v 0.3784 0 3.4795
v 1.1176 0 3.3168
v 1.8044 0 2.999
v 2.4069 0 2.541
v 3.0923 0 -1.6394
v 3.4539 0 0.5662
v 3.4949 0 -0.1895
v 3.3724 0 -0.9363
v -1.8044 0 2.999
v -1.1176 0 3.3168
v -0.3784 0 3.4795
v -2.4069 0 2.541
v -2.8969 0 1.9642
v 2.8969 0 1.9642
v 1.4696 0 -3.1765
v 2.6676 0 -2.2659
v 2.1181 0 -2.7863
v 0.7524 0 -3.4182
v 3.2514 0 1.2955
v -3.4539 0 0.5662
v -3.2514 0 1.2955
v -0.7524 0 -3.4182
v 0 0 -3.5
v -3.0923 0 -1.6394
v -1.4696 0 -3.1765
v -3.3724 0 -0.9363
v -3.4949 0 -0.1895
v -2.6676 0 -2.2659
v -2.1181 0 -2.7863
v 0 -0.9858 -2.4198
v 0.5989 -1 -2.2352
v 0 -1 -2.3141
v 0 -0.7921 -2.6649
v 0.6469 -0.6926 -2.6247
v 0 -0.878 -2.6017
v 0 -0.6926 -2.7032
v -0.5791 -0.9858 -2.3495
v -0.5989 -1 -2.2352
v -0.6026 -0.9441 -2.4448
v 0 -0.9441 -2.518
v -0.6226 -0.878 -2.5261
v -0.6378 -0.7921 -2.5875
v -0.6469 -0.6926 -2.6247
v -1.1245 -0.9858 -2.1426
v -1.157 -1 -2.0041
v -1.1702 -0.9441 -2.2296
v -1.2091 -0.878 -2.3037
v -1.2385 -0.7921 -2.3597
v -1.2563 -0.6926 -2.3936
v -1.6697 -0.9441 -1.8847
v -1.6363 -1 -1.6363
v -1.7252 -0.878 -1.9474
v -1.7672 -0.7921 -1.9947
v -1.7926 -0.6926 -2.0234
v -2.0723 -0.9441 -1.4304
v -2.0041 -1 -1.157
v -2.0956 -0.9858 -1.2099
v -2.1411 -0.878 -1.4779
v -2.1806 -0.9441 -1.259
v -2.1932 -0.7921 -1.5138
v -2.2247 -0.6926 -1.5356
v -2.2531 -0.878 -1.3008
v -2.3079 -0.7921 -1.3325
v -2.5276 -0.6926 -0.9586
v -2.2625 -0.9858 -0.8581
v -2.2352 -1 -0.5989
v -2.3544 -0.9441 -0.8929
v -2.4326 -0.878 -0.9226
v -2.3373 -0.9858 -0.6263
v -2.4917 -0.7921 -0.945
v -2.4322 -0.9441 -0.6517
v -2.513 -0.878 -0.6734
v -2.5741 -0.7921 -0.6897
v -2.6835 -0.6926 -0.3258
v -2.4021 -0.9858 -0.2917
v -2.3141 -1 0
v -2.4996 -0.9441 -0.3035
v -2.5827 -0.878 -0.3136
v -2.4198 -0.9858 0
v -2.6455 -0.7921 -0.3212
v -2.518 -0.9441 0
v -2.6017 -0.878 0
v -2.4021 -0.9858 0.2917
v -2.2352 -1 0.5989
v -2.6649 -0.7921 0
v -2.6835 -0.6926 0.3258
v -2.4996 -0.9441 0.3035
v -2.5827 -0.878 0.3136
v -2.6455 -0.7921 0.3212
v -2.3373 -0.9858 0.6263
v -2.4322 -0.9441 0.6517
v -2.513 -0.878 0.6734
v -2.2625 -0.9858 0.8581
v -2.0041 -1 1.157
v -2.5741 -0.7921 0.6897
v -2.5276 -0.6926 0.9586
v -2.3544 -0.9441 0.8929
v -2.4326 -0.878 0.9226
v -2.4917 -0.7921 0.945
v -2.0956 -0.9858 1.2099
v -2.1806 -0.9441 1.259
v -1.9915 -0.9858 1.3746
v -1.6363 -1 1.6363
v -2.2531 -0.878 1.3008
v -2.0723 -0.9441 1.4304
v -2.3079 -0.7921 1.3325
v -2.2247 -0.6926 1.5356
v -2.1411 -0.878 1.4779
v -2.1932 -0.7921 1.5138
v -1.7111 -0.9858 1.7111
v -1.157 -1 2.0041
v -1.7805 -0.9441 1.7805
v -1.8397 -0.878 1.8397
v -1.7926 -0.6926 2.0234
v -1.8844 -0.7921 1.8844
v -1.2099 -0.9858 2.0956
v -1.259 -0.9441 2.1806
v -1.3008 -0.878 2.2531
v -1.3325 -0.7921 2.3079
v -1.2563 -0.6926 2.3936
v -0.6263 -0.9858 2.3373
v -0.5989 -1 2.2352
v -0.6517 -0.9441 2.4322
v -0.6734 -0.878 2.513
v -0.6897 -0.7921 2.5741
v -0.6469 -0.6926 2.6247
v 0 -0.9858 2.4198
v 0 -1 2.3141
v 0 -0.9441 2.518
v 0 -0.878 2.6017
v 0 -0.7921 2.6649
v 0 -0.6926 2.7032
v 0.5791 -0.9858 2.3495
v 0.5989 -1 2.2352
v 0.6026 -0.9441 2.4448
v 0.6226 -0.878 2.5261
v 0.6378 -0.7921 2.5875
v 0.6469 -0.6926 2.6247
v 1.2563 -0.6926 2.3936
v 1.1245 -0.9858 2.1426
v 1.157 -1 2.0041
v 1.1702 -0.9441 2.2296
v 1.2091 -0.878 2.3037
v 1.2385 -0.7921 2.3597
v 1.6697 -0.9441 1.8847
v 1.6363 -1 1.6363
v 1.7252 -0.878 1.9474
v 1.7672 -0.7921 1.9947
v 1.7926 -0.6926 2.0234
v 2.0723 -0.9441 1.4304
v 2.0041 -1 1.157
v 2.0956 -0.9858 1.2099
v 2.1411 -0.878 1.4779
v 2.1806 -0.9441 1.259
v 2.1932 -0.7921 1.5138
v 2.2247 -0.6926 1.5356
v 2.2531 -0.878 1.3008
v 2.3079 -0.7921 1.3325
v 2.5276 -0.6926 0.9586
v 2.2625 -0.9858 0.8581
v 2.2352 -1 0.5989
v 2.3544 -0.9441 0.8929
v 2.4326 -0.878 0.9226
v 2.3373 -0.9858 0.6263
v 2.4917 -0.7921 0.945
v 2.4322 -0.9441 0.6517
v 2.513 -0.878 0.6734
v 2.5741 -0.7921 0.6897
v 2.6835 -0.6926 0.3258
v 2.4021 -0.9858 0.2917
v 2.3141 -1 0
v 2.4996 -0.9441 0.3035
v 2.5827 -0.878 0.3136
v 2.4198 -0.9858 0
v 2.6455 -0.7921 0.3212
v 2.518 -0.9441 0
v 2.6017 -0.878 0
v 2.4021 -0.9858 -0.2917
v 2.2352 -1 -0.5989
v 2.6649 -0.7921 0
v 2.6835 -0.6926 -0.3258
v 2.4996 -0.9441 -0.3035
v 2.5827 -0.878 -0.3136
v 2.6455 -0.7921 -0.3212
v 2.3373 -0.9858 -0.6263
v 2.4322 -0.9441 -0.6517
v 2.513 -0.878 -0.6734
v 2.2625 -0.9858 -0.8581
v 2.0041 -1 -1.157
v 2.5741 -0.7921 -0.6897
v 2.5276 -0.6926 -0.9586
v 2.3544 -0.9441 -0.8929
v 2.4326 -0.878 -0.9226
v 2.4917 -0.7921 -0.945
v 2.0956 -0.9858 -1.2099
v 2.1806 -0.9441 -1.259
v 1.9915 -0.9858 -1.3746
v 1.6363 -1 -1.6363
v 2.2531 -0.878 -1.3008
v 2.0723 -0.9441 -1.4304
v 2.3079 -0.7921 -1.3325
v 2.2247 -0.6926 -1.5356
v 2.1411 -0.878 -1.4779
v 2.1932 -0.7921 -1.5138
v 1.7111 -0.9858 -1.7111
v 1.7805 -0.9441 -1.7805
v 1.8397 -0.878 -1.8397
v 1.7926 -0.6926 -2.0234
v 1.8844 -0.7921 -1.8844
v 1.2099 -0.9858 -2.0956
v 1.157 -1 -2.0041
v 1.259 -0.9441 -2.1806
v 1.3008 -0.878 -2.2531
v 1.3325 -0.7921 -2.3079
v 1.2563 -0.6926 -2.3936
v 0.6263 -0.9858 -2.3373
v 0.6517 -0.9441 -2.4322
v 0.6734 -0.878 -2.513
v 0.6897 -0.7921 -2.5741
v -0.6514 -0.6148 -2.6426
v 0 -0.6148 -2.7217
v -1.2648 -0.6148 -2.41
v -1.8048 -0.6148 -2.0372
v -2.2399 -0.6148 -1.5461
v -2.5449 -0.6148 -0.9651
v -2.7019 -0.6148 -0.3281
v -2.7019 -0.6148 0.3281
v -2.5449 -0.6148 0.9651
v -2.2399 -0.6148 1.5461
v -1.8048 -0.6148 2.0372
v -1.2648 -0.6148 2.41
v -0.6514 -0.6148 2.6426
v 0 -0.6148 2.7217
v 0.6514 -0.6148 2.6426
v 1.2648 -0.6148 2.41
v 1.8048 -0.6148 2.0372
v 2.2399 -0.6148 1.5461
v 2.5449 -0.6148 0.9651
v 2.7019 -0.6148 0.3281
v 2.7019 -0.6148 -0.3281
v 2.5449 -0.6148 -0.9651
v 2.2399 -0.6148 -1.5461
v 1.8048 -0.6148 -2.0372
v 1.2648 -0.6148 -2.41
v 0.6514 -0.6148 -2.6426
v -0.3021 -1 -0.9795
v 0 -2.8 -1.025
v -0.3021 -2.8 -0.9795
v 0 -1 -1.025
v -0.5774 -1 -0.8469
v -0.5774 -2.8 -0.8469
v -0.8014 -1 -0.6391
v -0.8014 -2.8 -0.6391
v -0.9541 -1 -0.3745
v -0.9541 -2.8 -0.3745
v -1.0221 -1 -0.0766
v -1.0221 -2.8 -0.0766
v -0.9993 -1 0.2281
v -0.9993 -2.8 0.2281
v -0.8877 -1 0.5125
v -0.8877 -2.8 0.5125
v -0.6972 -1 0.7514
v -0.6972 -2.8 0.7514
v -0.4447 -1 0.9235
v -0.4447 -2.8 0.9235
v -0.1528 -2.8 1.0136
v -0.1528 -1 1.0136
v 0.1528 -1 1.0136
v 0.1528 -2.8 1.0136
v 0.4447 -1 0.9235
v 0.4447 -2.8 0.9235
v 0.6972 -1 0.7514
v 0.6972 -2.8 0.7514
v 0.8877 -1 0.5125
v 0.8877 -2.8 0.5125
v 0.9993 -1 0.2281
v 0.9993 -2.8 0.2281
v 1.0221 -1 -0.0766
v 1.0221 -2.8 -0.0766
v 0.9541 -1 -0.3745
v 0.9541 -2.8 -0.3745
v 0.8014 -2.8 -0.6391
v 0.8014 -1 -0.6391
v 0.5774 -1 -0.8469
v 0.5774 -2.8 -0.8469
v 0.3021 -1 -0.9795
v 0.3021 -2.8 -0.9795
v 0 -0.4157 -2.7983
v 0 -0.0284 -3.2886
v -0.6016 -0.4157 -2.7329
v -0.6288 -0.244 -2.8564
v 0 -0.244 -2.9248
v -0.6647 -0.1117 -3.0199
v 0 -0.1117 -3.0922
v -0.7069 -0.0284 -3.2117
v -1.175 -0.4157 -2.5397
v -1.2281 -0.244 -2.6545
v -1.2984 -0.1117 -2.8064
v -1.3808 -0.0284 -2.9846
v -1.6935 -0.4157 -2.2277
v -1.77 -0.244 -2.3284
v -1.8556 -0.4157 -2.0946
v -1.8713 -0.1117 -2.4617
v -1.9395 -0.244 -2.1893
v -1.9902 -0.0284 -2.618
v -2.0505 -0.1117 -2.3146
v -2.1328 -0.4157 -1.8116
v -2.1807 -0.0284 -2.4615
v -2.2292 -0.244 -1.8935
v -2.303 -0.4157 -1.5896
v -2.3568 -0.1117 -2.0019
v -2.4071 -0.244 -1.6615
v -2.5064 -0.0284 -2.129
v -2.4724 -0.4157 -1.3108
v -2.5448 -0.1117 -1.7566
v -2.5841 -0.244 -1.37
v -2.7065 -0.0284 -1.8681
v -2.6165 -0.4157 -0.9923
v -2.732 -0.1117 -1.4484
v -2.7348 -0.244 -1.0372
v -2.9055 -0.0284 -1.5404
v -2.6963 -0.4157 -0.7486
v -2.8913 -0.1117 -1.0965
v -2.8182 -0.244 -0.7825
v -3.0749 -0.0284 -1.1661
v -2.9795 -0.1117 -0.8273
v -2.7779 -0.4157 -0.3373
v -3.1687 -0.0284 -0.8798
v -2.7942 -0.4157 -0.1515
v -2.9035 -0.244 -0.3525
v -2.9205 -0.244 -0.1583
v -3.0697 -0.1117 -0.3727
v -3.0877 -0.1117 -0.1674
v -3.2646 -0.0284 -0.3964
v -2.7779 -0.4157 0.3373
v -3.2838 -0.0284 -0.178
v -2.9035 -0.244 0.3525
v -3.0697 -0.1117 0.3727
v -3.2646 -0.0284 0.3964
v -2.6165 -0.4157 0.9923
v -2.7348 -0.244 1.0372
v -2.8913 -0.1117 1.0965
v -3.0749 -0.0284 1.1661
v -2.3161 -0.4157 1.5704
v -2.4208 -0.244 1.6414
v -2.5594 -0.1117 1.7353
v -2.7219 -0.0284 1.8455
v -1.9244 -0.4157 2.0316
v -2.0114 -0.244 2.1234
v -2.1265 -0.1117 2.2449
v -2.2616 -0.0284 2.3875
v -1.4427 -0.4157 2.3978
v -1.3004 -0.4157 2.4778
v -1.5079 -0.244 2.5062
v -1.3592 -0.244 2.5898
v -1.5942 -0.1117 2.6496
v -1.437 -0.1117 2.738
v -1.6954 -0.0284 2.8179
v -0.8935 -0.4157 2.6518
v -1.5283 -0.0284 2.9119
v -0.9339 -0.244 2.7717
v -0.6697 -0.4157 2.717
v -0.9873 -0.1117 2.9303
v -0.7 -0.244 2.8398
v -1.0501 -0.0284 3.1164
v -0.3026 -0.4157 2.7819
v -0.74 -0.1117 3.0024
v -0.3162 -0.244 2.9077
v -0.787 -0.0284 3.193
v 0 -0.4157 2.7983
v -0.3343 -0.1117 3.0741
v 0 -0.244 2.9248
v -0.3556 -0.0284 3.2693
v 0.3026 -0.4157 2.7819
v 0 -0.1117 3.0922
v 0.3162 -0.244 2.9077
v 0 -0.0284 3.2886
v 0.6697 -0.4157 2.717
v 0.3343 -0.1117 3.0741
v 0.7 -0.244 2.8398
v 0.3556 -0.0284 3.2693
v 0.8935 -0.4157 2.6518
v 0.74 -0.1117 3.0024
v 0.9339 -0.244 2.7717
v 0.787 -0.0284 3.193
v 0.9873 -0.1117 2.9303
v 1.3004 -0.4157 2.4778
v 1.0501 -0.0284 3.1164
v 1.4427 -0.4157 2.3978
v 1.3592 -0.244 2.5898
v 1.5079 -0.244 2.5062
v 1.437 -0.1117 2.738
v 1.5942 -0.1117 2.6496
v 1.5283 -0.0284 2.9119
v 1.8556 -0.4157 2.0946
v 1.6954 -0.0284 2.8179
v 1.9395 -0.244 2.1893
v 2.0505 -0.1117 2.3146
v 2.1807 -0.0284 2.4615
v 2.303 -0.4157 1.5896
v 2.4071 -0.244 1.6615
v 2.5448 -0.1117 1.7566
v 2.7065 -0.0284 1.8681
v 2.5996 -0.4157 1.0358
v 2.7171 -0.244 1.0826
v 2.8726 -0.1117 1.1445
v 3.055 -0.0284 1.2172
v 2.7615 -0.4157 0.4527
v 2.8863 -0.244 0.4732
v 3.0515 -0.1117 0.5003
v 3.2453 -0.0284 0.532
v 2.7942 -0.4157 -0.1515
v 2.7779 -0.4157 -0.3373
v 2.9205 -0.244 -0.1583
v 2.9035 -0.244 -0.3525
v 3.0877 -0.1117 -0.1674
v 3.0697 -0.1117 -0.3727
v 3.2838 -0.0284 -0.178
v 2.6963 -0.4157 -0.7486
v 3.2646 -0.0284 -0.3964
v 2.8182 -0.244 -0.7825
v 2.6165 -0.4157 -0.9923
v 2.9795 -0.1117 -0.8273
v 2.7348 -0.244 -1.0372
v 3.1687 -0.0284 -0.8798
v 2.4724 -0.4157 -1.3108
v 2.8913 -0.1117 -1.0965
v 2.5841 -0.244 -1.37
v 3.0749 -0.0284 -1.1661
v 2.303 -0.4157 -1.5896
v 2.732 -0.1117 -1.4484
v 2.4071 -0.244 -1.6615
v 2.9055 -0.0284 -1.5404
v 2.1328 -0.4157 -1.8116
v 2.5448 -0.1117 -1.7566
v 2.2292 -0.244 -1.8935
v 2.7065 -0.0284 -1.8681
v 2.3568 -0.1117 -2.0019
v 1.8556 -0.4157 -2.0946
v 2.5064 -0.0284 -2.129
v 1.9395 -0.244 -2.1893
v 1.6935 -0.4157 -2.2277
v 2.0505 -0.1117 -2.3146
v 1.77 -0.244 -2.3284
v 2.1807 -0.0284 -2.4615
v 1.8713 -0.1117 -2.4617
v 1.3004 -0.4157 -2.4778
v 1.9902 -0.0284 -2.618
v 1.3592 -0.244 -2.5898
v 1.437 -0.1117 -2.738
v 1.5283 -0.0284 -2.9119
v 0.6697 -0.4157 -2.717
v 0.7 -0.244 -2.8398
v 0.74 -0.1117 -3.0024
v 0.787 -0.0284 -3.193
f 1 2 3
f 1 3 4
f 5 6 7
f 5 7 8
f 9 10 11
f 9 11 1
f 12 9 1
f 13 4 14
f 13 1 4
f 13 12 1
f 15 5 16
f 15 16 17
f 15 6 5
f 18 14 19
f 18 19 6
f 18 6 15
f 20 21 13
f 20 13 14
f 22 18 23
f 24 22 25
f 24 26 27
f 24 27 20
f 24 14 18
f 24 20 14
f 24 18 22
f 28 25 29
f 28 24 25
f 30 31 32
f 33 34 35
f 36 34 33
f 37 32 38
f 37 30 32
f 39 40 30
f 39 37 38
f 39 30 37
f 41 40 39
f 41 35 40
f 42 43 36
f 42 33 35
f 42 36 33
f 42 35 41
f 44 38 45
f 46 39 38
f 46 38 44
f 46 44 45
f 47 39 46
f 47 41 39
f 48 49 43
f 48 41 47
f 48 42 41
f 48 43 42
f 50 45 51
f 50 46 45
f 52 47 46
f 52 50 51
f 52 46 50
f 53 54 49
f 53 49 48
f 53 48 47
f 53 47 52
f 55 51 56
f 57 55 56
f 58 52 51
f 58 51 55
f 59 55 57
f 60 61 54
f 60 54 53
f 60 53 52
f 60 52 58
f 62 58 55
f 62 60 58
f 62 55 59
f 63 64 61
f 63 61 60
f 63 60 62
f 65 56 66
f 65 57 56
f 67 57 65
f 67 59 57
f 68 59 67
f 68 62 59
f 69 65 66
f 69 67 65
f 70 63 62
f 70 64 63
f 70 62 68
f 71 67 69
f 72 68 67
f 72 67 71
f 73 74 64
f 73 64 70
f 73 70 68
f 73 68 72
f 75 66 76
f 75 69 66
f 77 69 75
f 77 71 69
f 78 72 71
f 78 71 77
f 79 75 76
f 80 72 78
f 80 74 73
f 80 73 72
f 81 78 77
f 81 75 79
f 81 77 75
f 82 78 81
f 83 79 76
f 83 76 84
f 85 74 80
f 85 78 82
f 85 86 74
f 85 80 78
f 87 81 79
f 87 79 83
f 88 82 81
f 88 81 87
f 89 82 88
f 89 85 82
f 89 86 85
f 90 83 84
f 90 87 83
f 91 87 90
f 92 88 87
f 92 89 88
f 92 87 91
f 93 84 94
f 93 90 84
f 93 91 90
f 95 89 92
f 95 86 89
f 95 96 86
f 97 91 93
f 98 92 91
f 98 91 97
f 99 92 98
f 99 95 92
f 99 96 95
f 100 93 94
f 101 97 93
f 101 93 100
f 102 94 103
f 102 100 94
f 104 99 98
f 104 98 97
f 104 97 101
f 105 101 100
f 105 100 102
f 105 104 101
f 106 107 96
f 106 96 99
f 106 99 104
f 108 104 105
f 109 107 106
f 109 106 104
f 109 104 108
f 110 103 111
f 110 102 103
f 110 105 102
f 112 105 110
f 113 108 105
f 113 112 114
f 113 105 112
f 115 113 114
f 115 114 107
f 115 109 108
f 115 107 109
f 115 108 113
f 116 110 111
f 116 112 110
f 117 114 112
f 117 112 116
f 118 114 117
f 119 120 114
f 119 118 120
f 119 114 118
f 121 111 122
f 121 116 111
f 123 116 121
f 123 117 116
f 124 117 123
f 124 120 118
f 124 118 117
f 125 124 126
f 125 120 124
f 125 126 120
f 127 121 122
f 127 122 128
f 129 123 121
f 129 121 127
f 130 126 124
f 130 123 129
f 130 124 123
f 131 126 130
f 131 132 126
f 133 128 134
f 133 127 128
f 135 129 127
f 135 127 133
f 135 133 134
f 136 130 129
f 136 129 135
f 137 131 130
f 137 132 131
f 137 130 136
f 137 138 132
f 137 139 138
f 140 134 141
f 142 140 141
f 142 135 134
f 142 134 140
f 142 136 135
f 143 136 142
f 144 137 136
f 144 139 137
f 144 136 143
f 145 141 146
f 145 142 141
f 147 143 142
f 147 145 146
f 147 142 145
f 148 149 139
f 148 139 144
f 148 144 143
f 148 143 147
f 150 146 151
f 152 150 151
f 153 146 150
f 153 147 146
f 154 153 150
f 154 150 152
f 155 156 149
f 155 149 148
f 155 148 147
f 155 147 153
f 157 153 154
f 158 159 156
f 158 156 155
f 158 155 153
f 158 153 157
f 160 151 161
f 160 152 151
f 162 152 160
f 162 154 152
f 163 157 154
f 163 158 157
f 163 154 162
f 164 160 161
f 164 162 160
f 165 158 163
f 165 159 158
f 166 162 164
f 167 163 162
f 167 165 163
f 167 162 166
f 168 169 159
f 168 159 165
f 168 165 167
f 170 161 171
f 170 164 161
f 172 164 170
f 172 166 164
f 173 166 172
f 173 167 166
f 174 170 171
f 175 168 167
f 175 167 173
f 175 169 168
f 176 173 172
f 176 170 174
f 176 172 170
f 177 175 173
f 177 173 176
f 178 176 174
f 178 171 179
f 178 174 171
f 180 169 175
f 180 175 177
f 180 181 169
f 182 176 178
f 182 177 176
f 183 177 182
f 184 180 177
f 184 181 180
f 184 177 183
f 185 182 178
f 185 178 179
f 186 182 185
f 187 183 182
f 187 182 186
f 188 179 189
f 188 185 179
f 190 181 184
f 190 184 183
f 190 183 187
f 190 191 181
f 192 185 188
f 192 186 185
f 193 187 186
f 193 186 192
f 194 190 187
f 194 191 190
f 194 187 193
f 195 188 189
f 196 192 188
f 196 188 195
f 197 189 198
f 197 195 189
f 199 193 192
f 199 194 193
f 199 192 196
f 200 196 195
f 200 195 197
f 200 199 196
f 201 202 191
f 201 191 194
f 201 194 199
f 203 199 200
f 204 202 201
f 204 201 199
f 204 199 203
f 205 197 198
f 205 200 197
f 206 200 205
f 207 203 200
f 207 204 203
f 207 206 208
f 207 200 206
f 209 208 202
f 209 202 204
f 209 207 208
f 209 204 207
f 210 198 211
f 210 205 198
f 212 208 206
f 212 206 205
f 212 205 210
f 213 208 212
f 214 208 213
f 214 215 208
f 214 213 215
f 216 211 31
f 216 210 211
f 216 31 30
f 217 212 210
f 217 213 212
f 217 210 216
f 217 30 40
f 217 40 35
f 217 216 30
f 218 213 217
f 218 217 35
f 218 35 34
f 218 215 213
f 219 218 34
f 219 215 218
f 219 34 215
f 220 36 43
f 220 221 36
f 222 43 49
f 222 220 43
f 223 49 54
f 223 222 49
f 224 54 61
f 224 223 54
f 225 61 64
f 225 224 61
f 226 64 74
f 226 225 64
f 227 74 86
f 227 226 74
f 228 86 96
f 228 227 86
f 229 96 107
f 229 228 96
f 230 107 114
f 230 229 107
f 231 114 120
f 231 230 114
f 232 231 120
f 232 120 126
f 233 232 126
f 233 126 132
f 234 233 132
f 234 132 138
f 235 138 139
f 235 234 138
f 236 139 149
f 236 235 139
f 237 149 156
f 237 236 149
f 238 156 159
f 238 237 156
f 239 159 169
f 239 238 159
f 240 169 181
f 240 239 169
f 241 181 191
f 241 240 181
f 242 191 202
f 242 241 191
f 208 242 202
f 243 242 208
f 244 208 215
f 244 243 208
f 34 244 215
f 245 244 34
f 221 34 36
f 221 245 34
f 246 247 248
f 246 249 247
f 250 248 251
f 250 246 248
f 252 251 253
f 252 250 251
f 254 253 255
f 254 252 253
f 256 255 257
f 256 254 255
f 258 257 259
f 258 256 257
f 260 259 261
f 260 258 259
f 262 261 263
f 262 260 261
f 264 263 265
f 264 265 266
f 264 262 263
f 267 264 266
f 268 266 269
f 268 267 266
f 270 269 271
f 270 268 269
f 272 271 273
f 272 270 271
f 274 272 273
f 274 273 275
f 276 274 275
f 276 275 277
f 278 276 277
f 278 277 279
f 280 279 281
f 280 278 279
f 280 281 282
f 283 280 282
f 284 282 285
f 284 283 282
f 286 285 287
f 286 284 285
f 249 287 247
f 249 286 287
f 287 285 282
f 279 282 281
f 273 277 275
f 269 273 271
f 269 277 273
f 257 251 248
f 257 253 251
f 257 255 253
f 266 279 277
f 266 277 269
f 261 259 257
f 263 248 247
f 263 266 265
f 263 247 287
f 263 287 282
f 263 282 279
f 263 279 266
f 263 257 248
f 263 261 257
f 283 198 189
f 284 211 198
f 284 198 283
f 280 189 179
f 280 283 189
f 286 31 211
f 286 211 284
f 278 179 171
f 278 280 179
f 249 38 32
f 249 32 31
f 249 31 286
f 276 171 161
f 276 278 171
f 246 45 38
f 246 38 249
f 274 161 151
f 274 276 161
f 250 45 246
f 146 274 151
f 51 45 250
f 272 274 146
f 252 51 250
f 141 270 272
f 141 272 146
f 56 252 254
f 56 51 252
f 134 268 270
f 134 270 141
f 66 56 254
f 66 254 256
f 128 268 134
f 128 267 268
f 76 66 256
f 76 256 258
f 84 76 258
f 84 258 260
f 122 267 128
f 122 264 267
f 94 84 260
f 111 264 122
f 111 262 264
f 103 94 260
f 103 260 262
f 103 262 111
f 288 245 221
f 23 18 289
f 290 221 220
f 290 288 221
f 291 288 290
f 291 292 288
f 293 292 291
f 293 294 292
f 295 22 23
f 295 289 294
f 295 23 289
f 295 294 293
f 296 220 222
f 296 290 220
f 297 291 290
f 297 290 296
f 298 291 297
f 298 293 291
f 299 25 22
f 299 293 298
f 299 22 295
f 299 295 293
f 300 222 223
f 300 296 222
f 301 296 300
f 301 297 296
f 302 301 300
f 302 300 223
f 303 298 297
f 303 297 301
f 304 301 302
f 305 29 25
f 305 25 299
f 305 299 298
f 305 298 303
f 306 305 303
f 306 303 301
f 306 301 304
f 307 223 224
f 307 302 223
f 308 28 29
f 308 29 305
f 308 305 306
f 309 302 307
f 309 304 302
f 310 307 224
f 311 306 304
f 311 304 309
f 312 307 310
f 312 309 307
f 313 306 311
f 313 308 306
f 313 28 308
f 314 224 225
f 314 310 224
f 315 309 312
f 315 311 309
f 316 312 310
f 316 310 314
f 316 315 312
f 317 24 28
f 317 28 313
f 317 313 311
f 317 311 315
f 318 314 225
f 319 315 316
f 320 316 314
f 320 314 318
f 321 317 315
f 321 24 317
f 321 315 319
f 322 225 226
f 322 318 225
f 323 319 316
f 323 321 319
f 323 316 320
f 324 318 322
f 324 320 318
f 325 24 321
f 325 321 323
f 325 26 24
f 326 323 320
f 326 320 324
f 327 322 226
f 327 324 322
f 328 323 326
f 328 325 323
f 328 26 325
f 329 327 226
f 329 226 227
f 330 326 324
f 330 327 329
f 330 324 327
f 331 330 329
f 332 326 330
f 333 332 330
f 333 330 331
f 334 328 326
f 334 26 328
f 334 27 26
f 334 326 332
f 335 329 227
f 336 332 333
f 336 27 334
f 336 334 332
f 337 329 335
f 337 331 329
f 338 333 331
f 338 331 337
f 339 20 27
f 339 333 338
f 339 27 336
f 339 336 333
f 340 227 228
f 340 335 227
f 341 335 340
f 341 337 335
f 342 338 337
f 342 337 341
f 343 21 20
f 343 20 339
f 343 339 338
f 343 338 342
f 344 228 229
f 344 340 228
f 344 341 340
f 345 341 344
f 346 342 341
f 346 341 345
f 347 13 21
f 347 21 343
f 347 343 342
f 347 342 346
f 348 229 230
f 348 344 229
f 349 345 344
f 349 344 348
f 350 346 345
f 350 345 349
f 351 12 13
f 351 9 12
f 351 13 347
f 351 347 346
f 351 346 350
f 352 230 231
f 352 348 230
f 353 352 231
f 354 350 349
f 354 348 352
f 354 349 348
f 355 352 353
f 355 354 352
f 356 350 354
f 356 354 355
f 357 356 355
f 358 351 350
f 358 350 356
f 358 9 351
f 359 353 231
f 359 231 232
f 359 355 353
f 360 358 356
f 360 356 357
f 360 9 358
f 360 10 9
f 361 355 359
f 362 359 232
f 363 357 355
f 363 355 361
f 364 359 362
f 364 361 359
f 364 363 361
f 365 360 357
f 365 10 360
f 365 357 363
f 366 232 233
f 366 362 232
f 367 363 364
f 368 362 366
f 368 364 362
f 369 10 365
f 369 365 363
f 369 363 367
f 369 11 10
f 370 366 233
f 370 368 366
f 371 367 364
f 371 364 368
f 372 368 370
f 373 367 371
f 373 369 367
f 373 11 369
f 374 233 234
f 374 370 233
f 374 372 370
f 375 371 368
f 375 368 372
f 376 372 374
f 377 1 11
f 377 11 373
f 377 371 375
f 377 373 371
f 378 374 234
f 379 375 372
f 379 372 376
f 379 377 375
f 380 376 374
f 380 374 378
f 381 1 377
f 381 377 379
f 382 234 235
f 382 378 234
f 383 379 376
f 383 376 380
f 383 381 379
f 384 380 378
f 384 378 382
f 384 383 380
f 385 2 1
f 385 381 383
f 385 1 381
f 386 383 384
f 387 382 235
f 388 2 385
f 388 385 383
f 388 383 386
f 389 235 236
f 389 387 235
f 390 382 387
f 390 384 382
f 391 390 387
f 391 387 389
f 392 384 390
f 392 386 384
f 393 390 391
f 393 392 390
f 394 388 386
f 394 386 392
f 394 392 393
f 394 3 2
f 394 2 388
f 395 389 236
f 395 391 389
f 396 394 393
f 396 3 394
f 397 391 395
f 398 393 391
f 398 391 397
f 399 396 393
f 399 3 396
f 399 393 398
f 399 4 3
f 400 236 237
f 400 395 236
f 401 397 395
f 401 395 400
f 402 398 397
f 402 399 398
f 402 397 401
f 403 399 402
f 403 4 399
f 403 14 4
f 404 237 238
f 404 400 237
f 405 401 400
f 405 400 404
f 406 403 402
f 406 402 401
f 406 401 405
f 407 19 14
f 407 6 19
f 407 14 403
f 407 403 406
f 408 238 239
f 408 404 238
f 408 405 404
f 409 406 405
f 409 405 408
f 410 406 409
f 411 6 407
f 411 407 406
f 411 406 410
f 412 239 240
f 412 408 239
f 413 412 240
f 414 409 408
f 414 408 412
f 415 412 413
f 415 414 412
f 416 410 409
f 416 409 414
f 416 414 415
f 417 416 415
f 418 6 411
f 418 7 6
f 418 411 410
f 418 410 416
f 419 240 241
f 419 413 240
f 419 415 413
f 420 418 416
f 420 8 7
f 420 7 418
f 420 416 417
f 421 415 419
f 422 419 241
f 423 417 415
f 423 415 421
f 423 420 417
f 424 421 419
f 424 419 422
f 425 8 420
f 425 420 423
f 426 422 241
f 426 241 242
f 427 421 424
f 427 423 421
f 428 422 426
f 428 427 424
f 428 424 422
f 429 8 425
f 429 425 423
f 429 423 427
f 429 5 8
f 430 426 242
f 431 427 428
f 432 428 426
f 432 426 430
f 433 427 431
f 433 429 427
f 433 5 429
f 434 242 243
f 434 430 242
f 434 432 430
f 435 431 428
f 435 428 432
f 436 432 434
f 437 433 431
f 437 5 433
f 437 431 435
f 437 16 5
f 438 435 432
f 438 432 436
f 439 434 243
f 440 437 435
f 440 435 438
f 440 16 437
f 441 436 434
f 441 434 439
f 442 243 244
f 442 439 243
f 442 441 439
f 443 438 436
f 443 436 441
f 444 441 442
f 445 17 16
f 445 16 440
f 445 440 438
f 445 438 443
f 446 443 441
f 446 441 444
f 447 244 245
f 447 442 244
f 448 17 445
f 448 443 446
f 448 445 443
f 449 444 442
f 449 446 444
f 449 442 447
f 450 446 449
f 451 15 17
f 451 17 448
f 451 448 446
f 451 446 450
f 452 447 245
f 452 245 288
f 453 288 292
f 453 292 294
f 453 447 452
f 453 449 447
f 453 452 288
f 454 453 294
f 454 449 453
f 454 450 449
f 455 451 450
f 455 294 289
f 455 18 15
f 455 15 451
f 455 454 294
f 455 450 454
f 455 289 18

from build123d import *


with BuildPart() as part:
    # Эскиз1 → Повернуть1 (revolve)
    with BuildSketch(Plane.XY, mode=Mode.PRIVATE) as revolve_1_sk:
        with BuildLine():
            Line((0, 0), (0, -2.8))
            Line((0, -2.8), (1.025, -2.8))
            Line((1.025, -2.8), (1.025, -1))
            Line((1.025, -1), (2.314086796, -1))
            ThreePointArc((2.314086796, -1), (2.562042805, -0.913875481), (2.703223354, -0.692589088))
            Line((2.703223354, -0.692589088), (2.721726884, -0.614821824))
            ThreePointArc((2.721726884, -0.614821824), (3.004087982, -0.172249038), (3.5, 0))
            Line((3.5, 0), (0, 0))
        make_face()
    revolve(revolve_1_sk.sketch.rotate(Axis((0, 0, 0), (0, 1, 0)), 90), axis=Axis((0, 0, 0), (0, 1, 0)))


solid = part.part
